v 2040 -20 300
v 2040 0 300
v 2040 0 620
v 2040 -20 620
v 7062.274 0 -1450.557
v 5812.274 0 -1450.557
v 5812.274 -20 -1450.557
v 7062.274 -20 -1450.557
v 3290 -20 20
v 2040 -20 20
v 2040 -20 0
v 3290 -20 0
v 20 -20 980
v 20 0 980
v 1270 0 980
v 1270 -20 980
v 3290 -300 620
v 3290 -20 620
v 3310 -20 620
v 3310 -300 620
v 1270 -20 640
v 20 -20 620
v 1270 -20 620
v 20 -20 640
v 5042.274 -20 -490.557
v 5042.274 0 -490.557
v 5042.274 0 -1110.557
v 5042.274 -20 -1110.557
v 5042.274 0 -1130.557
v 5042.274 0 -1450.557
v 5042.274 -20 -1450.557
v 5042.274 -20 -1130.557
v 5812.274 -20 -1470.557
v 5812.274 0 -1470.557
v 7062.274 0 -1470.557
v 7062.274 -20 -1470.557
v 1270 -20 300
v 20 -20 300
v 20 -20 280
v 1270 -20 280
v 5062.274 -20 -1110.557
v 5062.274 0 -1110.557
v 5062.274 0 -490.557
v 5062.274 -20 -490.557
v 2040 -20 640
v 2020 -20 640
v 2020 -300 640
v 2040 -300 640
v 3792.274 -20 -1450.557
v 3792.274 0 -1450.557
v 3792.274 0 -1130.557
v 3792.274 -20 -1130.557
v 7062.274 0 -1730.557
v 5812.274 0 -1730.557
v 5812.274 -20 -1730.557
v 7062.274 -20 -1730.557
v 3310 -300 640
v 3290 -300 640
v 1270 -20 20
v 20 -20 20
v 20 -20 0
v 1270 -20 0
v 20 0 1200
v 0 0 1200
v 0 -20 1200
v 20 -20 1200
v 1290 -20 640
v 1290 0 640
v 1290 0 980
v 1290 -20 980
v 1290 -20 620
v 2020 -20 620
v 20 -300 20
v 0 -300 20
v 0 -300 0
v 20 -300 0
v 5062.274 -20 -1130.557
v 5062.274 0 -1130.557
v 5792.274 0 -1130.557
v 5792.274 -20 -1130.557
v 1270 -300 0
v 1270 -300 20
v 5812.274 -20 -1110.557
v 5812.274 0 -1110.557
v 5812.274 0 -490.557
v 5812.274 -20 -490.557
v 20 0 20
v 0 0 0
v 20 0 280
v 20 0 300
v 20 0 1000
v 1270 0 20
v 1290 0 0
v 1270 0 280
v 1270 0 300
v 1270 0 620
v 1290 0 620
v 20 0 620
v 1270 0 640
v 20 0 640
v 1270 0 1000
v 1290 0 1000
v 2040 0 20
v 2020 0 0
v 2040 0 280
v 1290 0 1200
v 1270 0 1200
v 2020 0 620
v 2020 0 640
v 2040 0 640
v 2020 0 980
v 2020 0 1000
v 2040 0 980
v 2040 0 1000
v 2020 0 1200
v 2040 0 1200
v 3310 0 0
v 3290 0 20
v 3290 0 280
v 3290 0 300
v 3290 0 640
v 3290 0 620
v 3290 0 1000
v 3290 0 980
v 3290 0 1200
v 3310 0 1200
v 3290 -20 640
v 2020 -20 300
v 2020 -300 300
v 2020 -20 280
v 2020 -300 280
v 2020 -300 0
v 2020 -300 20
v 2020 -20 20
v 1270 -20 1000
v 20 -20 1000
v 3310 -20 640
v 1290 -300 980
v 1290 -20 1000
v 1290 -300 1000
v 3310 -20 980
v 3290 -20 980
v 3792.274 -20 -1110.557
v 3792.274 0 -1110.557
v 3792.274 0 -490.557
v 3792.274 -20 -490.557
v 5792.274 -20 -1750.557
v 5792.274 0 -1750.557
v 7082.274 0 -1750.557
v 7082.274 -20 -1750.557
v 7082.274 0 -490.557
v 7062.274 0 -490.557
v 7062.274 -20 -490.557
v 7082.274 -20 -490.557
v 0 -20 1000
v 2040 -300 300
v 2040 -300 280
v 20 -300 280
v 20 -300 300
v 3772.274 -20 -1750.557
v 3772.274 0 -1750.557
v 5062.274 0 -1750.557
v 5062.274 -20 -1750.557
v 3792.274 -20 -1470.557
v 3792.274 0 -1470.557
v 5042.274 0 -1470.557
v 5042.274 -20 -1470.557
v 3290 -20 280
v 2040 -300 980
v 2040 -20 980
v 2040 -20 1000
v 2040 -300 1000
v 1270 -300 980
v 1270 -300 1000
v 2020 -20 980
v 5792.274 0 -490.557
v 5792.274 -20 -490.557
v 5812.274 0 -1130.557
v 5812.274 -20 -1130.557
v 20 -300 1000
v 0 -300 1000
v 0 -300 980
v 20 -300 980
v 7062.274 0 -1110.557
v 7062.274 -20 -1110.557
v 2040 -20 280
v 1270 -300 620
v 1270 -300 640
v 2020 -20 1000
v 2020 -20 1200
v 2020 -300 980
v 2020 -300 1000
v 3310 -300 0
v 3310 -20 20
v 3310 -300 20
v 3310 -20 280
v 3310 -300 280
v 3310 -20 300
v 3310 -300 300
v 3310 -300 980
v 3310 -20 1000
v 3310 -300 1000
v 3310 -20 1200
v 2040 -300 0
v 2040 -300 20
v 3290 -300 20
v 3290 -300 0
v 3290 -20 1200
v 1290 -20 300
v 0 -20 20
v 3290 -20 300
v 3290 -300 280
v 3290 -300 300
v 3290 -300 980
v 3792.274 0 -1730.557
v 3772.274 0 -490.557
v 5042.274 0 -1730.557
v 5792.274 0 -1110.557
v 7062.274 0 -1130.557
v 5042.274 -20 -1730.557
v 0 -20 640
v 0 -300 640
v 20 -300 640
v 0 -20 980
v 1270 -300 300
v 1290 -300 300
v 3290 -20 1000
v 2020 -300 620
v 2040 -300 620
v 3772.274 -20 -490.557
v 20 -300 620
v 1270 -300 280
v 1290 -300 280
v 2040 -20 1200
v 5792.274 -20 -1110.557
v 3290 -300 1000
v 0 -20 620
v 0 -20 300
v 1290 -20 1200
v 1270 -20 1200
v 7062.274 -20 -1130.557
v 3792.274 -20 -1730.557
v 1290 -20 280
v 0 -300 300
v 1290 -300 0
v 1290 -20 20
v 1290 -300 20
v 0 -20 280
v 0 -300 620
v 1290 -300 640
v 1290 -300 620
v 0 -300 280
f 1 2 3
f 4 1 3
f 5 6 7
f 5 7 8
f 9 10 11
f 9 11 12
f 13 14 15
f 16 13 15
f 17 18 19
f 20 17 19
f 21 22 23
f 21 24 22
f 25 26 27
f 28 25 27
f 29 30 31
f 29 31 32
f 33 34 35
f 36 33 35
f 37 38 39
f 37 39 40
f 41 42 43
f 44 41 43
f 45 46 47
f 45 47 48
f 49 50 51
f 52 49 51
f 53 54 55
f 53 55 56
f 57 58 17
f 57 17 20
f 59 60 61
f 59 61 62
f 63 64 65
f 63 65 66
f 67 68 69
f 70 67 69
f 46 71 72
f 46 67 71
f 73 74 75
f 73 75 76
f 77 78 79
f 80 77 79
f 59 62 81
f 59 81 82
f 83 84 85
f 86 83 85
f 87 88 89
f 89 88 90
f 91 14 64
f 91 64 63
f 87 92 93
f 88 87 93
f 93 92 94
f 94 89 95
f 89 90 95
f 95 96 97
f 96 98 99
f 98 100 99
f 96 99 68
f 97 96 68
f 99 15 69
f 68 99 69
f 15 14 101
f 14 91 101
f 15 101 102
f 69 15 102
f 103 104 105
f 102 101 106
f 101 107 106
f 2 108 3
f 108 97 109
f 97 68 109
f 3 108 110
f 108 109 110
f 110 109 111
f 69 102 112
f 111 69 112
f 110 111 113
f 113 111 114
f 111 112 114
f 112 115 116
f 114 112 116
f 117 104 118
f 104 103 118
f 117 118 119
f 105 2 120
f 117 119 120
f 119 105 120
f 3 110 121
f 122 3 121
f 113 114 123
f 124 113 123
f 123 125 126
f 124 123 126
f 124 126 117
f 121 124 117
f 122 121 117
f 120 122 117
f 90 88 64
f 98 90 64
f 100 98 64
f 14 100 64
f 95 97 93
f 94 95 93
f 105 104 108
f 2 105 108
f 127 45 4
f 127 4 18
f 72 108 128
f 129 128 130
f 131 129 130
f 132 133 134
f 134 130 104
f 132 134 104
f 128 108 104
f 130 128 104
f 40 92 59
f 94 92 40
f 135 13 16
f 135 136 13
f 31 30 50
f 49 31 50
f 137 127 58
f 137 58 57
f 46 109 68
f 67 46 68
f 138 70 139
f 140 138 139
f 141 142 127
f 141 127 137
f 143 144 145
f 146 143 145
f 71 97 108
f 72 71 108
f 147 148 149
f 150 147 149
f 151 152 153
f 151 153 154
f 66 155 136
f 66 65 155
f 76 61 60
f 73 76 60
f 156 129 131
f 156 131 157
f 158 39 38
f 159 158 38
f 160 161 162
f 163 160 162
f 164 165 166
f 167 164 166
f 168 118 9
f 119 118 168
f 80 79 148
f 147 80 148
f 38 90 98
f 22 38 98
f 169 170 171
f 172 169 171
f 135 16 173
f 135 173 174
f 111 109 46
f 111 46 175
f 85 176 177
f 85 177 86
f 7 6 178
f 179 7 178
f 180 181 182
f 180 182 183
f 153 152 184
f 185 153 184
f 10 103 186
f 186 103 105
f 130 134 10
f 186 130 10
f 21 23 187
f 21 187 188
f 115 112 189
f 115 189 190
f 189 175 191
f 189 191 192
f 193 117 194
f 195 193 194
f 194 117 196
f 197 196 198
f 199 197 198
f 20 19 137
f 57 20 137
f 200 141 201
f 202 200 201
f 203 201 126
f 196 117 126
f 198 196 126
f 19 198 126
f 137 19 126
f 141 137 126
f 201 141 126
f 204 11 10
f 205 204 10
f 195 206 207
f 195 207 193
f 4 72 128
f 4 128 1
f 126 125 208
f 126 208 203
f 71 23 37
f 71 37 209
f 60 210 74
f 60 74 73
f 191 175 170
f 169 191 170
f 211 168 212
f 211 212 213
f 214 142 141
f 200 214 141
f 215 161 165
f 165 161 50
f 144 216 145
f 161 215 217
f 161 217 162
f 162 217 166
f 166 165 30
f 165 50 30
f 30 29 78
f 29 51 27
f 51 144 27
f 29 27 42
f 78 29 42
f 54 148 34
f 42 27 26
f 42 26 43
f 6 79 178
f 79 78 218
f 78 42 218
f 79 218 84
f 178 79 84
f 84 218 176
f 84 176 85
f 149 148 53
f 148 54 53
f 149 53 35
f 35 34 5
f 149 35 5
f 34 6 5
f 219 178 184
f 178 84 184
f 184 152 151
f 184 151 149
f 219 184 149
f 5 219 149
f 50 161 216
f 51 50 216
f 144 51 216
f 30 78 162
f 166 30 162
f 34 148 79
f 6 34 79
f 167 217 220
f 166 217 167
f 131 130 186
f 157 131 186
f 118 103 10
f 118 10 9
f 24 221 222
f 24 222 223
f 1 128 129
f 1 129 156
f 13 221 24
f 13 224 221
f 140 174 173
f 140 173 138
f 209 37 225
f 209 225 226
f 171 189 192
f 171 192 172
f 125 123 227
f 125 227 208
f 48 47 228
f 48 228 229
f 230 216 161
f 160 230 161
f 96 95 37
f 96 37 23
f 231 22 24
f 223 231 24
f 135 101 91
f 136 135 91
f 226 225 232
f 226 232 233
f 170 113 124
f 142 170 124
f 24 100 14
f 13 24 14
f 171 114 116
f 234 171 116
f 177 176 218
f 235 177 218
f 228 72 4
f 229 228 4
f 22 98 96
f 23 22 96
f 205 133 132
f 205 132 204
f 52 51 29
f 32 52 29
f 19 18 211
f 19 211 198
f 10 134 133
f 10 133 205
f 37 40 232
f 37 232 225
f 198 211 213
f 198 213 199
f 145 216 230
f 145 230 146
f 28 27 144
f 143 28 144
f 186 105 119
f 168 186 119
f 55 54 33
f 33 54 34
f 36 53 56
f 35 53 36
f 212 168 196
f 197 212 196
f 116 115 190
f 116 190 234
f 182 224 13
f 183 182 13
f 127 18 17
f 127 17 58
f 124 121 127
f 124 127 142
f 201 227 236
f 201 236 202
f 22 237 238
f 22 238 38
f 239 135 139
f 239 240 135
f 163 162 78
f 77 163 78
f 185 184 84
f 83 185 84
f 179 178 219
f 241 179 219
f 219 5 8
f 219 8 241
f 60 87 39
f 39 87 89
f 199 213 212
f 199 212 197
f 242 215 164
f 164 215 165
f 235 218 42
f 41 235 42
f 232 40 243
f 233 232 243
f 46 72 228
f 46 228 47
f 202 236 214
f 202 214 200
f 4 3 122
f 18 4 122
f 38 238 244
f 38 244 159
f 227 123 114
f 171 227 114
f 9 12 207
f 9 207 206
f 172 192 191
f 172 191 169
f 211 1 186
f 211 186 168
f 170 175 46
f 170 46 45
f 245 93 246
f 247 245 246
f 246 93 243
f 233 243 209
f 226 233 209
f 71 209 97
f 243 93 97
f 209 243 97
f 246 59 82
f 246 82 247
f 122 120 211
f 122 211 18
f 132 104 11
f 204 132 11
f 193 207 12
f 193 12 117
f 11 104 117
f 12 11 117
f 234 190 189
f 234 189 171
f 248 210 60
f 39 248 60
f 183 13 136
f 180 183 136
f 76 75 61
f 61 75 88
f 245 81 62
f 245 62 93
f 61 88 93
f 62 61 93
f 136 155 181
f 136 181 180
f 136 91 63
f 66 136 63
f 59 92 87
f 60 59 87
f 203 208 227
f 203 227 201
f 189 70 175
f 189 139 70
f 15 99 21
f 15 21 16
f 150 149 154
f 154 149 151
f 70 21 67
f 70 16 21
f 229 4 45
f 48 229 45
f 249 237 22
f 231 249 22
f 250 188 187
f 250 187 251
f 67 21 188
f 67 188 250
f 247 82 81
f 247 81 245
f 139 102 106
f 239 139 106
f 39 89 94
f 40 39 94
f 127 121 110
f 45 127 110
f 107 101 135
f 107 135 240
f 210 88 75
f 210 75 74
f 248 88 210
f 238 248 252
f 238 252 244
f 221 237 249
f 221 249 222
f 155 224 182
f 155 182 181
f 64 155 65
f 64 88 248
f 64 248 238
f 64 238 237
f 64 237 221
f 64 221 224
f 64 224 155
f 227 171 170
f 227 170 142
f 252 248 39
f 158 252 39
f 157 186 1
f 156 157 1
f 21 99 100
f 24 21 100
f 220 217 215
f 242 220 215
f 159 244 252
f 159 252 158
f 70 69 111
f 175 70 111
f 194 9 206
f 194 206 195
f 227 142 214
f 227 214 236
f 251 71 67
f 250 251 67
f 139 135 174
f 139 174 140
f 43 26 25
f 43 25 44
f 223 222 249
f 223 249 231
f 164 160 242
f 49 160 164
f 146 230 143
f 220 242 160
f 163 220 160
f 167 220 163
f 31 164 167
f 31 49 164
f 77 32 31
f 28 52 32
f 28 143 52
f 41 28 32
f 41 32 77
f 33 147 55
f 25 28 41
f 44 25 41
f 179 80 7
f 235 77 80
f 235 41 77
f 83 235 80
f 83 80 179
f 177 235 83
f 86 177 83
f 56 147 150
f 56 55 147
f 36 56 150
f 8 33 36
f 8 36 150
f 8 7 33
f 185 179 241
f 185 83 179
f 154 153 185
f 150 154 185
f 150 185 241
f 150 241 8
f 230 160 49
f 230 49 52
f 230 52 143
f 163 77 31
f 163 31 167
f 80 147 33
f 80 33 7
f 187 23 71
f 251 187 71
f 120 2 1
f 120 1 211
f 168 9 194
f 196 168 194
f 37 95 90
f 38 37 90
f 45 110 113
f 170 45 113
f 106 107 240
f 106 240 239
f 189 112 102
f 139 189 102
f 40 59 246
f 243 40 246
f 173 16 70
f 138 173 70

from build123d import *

# Parameters (mm, degrees)
F0_W     = 20
F0_H     = 20
F0_W_2   = 1250
F0_H_2   = 260
F0_H_3   = 320
F0_H_4   = 340
F0_W_3   = 730
F0_H_5   = 200
F1_DEPTH = 20
F0_H_6   = 620
F0_H_7   = 280
F2_W     = 20
F2_H     = 20
F3_DEPTH = 280


with BuildPart() as f1:
    # F0 (on Front) → F1 (new body)
    with BuildSketch(Plane.XZ):
        with Locations((10, 10)):
            Rectangle(F0_W, F0_H)
        with Locations((645, 10)):
            Rectangle(F0_W_2, F0_H)
        with Locations((10, 150)):
            Rectangle(F0_W, F0_H_2)
        with Locations((1280, 10)):
            Rectangle(F0_W, F0_H)
        with Locations((10, 290)):
            Rectangle(F0_W, F0_H)
        with Locations((1280, 150)):
            Rectangle(F0_W, F0_H_2)
        with Locations((645, 290)):
            Rectangle(F0_W_2, F0_H)
        with Locations((10, 460)):
            Rectangle(F0_W, F0_H_3)
        with Locations((1280, 290)):
            Rectangle(F0_W, F0_H)
        with Locations((10, 630)):
            Rectangle(F0_W, F0_H)
        with Locations((1280, 460)):
            Rectangle(F0_W, F0_H_3)
        with Locations((645, 630)):
            Rectangle(F0_W_2, F0_H)
        with Locations((10, 810)):
            Rectangle(F0_W, F0_H_4)
        with Locations((1280, 630)):
            Rectangle(F0_W, F0_H)
        with Locations((10, 990)):
            Rectangle(F0_W, F0_H)
        with Locations((1655, 630)):
            Rectangle(F0_W_3, F0_H)
        with Locations((1280, 810)):
            Rectangle(F0_W, F0_H_4)
        with Locations((645, 990)):
            Rectangle(F0_W_2, F0_H)
        with Locations((10, 1100)):
            Rectangle(F0_W, F0_H_5)
        with Locations((2030, 460)):
            Rectangle(F0_W, F0_H_3)
        with Locations((2030, 630)):
            Rectangle(F0_W, F0_H)
        with Locations((1280, 990)):
            Rectangle(F0_W, F0_H)
        with Locations((1655, 990)):
            Rectangle(F0_W_3, F0_H)
        with Locations((2030, 810)):
            Rectangle(F0_W, F0_H_4)
        with Locations((2030, 290)):
            Rectangle(F0_W, F0_H)
        with Locations((2665, 630)):
            Rectangle(F0_W_2, F0_H)
        with Locations((1280, 1100)):
            Rectangle(F0_W, F0_H_5)
        Polygon((2020, 1000), (2020, 980), (2040, 980), (3290, 980), (3290, 1000), (2040, 1000), align=None)
        with Locations((2030, 150)):
            Rectangle(F0_W, F0_H_2)
        with Locations((2665, 290)):
            Rectangle(F0_W_2, F0_H)
        with Locations((3300, 630)):
            Rectangle(F0_W, F0_H)
        with Locations((3300, 460)):
            Rectangle(F0_W, F0_H_3)
        with Locations((2030, 1100)):
            Rectangle(F0_W, F0_H_5)
        with Locations((3300, 810)):
            Rectangle(F0_W, F0_H_4)
        with Locations((2030, 10)):
            Rectangle(F0_W, F0_H)
        with Locations((3300, 290)):
            Rectangle(F0_W, F0_H)
        with Locations((3300, 990)):
            Rectangle(F0_W, F0_H)
        with Locations((2665, 10)):
            Rectangle(F0_W_2, F0_H)
        with Locations((3300, 150)):
            Rectangle(F0_W, F0_H_2)
        with Locations((3300, 1100)):
            Rectangle(F0_W, F0_H_5)
        with Locations((3300, 10)):
            Rectangle(F0_W, F0_H)
    extrude(amount=F1_DEPTH)

    # F2 (on face) → F3 (join)
    with BuildSketch(Plane.XZ.offset(20)):
        with Locations((10, 990)):
            Rectangle(F2_W, F2_H)
        with Locations((10, 630)):
            Rectangle(F2_W, F2_H)
        with Locations((10, 290)):
            Rectangle(F2_W, F2_H)
        with Locations((10, 10)):
            Rectangle(F2_W, F2_H)
        with Locations((1280, 290)):
            Rectangle(F2_W, F2_H)
        with Locations((1280, 990)):
            Rectangle(F2_W, F2_H)
        with Locations((1280, 630)):
            Rectangle(F2_W, F2_H)
        with Locations((1280, 10)):
            Rectangle(F2_W, F2_H)
        with Locations((2030, 630)):
            Rectangle(F2_W, F2_H)
        with Locations((2030, 290)):
            Rectangle(F2_W, F2_H)
        with Locations((2030, 10)):
            Rectangle(F2_W, F2_H)
        with Locations((3300, 10)):
            Rectangle(F2_W, F2_H)
        with Locations((3300, 630)):
            Rectangle(F2_W, F2_H)
        with Locations((3300, 290)):
            Rectangle(F2_W, F2_H)
        with Locations((2030, 990)):
            Rectangle(F2_W, F2_H)
        with Locations((3300, 990)):
            Rectangle(F2_W, F2_H)
    extrude(amount=F3_DEPTH)


with BuildPart() as f1b:
    # F0 (on Front) → F1, piece 2 (new body)
    with BuildSketch(Plane.XZ):
        with Locations((3782.2742335002, -1740.5566911344)):
            Rectangle(F0_W, F0_H)
        with Locations((4417.2742335002, -1740.5566911344)):
            Rectangle(F0_W_2, F0_H)
        with Locations((3782.2742335002, -1600.5566911344)):
            Rectangle(F0_W, F0_H_2)
        with Locations((5052.2742335002, -1740.5566911344)):
            Rectangle(F0_W, F0_H)
        with Locations((3782.2742335002, -1460.5566911344)):
            Rectangle(F0_W, F0_H)
        with Locations((5052.2742335002, -1600.5566911344)):
            Rectangle(F0_W, F0_H_2)
        with Locations((4417.2742335002, -1460.5566911344)):
            Rectangle(F0_W_2, F0_H)
        with Locations((3782.2742335002, -1290.5566911344)):
            Rectangle(F0_W, F0_H_3)
        with Locations((5052.2742335002, -1460.5566911344)):
            Rectangle(F0_W, F0_H)
        with Locations((3782.2742335002, -1120.5566911344)):
            Rectangle(F0_W, F0_H)
        with Locations((5052.2742335002, -1290.5566911344)):
            Rectangle(F0_W, F0_H_3)
        with Locations((4417.2742335002, -1120.5566911344)):
            Rectangle(F0_W_2, F0_H)
        with Locations((3782.2742335002, -800.5566911344)):
            Rectangle(F0_W, F0_H_6)
        with Locations((5052.2742335002, -1120.5566911344)):
            Rectangle(F0_W, F0_H)
        with Locations((5427.2742335002, -1120.5566911344)):
            Rectangle(F0_W_3, F0_H)
        with Locations((5052.2742335002, -940.5566911344)):
            Rectangle(F0_W, F0_H_4)
        with Locations((5802.2742335002, -1290.5566911344)):
            Rectangle(F0_W, F0_H_3)
        with Locations((5802.2742335002, -1120.5566911344)):
            Rectangle(F0_W, F0_H)
        with Locations((5052.2742335002, -630.5566911344)):
            Rectangle(F0_W, F0_H_7)
        with Locations((5802.2742335002, -940.5566911344)):
            Rectangle(F0_W, F0_H_4)
        with Locations((5802.2742335002, -1460.5566911344)):
            Rectangle(F0_W, F0_H)
        with Locations((6437.2742335002, -1120.5566911344)):
            Rectangle(F0_W_2, F0_H)
        with Locations((5802.2742335002, -630.5566911344)):
            Rectangle(F0_W, F0_H_7)
        with Locations((5802.2742335002, -1600.5566911344)):
            Rectangle(F0_W, F0_H_2)
        with Locations((6437.2742335002, -1460.5566911344)):
            Rectangle(F0_W_2, F0_H)
        with Locations((7072.2742335002, -1120.5566911344)):
            Rectangle(F0_W, F0_H)
        with Locations((7072.2742335002, -1290.5566911344)):
            Rectangle(F0_W, F0_H_3)
        with Locations((7072.2742335002, -940.5566911344)):
            Rectangle(F0_W, F0_H_4)
        with Locations((5802.2742335002, -1740.5566911344)):
            Rectangle(F0_W, F0_H)
        with Locations((7072.2742335002, -1460.5566911344)):
            Rectangle(F0_W, F0_H)
        with Locations((7072.2742335002, -630.5566911344)):
            Rectangle(F0_W, F0_H_7)
        with Locations((6437.2742335002, -1740.5566911344)):
            Rectangle(F0_W_2, F0_H)
        with Locations((7072.2742335002, -1600.5566911344)):
            Rectangle(F0_W, F0_H_2)
        with Locations((7072.2742335002, -1740.5566911344)):
            Rectangle(F0_W, F0_H)
    extrude(amount=F1_DEPTH)


solid = Compound([f1.part, f1b.part])
